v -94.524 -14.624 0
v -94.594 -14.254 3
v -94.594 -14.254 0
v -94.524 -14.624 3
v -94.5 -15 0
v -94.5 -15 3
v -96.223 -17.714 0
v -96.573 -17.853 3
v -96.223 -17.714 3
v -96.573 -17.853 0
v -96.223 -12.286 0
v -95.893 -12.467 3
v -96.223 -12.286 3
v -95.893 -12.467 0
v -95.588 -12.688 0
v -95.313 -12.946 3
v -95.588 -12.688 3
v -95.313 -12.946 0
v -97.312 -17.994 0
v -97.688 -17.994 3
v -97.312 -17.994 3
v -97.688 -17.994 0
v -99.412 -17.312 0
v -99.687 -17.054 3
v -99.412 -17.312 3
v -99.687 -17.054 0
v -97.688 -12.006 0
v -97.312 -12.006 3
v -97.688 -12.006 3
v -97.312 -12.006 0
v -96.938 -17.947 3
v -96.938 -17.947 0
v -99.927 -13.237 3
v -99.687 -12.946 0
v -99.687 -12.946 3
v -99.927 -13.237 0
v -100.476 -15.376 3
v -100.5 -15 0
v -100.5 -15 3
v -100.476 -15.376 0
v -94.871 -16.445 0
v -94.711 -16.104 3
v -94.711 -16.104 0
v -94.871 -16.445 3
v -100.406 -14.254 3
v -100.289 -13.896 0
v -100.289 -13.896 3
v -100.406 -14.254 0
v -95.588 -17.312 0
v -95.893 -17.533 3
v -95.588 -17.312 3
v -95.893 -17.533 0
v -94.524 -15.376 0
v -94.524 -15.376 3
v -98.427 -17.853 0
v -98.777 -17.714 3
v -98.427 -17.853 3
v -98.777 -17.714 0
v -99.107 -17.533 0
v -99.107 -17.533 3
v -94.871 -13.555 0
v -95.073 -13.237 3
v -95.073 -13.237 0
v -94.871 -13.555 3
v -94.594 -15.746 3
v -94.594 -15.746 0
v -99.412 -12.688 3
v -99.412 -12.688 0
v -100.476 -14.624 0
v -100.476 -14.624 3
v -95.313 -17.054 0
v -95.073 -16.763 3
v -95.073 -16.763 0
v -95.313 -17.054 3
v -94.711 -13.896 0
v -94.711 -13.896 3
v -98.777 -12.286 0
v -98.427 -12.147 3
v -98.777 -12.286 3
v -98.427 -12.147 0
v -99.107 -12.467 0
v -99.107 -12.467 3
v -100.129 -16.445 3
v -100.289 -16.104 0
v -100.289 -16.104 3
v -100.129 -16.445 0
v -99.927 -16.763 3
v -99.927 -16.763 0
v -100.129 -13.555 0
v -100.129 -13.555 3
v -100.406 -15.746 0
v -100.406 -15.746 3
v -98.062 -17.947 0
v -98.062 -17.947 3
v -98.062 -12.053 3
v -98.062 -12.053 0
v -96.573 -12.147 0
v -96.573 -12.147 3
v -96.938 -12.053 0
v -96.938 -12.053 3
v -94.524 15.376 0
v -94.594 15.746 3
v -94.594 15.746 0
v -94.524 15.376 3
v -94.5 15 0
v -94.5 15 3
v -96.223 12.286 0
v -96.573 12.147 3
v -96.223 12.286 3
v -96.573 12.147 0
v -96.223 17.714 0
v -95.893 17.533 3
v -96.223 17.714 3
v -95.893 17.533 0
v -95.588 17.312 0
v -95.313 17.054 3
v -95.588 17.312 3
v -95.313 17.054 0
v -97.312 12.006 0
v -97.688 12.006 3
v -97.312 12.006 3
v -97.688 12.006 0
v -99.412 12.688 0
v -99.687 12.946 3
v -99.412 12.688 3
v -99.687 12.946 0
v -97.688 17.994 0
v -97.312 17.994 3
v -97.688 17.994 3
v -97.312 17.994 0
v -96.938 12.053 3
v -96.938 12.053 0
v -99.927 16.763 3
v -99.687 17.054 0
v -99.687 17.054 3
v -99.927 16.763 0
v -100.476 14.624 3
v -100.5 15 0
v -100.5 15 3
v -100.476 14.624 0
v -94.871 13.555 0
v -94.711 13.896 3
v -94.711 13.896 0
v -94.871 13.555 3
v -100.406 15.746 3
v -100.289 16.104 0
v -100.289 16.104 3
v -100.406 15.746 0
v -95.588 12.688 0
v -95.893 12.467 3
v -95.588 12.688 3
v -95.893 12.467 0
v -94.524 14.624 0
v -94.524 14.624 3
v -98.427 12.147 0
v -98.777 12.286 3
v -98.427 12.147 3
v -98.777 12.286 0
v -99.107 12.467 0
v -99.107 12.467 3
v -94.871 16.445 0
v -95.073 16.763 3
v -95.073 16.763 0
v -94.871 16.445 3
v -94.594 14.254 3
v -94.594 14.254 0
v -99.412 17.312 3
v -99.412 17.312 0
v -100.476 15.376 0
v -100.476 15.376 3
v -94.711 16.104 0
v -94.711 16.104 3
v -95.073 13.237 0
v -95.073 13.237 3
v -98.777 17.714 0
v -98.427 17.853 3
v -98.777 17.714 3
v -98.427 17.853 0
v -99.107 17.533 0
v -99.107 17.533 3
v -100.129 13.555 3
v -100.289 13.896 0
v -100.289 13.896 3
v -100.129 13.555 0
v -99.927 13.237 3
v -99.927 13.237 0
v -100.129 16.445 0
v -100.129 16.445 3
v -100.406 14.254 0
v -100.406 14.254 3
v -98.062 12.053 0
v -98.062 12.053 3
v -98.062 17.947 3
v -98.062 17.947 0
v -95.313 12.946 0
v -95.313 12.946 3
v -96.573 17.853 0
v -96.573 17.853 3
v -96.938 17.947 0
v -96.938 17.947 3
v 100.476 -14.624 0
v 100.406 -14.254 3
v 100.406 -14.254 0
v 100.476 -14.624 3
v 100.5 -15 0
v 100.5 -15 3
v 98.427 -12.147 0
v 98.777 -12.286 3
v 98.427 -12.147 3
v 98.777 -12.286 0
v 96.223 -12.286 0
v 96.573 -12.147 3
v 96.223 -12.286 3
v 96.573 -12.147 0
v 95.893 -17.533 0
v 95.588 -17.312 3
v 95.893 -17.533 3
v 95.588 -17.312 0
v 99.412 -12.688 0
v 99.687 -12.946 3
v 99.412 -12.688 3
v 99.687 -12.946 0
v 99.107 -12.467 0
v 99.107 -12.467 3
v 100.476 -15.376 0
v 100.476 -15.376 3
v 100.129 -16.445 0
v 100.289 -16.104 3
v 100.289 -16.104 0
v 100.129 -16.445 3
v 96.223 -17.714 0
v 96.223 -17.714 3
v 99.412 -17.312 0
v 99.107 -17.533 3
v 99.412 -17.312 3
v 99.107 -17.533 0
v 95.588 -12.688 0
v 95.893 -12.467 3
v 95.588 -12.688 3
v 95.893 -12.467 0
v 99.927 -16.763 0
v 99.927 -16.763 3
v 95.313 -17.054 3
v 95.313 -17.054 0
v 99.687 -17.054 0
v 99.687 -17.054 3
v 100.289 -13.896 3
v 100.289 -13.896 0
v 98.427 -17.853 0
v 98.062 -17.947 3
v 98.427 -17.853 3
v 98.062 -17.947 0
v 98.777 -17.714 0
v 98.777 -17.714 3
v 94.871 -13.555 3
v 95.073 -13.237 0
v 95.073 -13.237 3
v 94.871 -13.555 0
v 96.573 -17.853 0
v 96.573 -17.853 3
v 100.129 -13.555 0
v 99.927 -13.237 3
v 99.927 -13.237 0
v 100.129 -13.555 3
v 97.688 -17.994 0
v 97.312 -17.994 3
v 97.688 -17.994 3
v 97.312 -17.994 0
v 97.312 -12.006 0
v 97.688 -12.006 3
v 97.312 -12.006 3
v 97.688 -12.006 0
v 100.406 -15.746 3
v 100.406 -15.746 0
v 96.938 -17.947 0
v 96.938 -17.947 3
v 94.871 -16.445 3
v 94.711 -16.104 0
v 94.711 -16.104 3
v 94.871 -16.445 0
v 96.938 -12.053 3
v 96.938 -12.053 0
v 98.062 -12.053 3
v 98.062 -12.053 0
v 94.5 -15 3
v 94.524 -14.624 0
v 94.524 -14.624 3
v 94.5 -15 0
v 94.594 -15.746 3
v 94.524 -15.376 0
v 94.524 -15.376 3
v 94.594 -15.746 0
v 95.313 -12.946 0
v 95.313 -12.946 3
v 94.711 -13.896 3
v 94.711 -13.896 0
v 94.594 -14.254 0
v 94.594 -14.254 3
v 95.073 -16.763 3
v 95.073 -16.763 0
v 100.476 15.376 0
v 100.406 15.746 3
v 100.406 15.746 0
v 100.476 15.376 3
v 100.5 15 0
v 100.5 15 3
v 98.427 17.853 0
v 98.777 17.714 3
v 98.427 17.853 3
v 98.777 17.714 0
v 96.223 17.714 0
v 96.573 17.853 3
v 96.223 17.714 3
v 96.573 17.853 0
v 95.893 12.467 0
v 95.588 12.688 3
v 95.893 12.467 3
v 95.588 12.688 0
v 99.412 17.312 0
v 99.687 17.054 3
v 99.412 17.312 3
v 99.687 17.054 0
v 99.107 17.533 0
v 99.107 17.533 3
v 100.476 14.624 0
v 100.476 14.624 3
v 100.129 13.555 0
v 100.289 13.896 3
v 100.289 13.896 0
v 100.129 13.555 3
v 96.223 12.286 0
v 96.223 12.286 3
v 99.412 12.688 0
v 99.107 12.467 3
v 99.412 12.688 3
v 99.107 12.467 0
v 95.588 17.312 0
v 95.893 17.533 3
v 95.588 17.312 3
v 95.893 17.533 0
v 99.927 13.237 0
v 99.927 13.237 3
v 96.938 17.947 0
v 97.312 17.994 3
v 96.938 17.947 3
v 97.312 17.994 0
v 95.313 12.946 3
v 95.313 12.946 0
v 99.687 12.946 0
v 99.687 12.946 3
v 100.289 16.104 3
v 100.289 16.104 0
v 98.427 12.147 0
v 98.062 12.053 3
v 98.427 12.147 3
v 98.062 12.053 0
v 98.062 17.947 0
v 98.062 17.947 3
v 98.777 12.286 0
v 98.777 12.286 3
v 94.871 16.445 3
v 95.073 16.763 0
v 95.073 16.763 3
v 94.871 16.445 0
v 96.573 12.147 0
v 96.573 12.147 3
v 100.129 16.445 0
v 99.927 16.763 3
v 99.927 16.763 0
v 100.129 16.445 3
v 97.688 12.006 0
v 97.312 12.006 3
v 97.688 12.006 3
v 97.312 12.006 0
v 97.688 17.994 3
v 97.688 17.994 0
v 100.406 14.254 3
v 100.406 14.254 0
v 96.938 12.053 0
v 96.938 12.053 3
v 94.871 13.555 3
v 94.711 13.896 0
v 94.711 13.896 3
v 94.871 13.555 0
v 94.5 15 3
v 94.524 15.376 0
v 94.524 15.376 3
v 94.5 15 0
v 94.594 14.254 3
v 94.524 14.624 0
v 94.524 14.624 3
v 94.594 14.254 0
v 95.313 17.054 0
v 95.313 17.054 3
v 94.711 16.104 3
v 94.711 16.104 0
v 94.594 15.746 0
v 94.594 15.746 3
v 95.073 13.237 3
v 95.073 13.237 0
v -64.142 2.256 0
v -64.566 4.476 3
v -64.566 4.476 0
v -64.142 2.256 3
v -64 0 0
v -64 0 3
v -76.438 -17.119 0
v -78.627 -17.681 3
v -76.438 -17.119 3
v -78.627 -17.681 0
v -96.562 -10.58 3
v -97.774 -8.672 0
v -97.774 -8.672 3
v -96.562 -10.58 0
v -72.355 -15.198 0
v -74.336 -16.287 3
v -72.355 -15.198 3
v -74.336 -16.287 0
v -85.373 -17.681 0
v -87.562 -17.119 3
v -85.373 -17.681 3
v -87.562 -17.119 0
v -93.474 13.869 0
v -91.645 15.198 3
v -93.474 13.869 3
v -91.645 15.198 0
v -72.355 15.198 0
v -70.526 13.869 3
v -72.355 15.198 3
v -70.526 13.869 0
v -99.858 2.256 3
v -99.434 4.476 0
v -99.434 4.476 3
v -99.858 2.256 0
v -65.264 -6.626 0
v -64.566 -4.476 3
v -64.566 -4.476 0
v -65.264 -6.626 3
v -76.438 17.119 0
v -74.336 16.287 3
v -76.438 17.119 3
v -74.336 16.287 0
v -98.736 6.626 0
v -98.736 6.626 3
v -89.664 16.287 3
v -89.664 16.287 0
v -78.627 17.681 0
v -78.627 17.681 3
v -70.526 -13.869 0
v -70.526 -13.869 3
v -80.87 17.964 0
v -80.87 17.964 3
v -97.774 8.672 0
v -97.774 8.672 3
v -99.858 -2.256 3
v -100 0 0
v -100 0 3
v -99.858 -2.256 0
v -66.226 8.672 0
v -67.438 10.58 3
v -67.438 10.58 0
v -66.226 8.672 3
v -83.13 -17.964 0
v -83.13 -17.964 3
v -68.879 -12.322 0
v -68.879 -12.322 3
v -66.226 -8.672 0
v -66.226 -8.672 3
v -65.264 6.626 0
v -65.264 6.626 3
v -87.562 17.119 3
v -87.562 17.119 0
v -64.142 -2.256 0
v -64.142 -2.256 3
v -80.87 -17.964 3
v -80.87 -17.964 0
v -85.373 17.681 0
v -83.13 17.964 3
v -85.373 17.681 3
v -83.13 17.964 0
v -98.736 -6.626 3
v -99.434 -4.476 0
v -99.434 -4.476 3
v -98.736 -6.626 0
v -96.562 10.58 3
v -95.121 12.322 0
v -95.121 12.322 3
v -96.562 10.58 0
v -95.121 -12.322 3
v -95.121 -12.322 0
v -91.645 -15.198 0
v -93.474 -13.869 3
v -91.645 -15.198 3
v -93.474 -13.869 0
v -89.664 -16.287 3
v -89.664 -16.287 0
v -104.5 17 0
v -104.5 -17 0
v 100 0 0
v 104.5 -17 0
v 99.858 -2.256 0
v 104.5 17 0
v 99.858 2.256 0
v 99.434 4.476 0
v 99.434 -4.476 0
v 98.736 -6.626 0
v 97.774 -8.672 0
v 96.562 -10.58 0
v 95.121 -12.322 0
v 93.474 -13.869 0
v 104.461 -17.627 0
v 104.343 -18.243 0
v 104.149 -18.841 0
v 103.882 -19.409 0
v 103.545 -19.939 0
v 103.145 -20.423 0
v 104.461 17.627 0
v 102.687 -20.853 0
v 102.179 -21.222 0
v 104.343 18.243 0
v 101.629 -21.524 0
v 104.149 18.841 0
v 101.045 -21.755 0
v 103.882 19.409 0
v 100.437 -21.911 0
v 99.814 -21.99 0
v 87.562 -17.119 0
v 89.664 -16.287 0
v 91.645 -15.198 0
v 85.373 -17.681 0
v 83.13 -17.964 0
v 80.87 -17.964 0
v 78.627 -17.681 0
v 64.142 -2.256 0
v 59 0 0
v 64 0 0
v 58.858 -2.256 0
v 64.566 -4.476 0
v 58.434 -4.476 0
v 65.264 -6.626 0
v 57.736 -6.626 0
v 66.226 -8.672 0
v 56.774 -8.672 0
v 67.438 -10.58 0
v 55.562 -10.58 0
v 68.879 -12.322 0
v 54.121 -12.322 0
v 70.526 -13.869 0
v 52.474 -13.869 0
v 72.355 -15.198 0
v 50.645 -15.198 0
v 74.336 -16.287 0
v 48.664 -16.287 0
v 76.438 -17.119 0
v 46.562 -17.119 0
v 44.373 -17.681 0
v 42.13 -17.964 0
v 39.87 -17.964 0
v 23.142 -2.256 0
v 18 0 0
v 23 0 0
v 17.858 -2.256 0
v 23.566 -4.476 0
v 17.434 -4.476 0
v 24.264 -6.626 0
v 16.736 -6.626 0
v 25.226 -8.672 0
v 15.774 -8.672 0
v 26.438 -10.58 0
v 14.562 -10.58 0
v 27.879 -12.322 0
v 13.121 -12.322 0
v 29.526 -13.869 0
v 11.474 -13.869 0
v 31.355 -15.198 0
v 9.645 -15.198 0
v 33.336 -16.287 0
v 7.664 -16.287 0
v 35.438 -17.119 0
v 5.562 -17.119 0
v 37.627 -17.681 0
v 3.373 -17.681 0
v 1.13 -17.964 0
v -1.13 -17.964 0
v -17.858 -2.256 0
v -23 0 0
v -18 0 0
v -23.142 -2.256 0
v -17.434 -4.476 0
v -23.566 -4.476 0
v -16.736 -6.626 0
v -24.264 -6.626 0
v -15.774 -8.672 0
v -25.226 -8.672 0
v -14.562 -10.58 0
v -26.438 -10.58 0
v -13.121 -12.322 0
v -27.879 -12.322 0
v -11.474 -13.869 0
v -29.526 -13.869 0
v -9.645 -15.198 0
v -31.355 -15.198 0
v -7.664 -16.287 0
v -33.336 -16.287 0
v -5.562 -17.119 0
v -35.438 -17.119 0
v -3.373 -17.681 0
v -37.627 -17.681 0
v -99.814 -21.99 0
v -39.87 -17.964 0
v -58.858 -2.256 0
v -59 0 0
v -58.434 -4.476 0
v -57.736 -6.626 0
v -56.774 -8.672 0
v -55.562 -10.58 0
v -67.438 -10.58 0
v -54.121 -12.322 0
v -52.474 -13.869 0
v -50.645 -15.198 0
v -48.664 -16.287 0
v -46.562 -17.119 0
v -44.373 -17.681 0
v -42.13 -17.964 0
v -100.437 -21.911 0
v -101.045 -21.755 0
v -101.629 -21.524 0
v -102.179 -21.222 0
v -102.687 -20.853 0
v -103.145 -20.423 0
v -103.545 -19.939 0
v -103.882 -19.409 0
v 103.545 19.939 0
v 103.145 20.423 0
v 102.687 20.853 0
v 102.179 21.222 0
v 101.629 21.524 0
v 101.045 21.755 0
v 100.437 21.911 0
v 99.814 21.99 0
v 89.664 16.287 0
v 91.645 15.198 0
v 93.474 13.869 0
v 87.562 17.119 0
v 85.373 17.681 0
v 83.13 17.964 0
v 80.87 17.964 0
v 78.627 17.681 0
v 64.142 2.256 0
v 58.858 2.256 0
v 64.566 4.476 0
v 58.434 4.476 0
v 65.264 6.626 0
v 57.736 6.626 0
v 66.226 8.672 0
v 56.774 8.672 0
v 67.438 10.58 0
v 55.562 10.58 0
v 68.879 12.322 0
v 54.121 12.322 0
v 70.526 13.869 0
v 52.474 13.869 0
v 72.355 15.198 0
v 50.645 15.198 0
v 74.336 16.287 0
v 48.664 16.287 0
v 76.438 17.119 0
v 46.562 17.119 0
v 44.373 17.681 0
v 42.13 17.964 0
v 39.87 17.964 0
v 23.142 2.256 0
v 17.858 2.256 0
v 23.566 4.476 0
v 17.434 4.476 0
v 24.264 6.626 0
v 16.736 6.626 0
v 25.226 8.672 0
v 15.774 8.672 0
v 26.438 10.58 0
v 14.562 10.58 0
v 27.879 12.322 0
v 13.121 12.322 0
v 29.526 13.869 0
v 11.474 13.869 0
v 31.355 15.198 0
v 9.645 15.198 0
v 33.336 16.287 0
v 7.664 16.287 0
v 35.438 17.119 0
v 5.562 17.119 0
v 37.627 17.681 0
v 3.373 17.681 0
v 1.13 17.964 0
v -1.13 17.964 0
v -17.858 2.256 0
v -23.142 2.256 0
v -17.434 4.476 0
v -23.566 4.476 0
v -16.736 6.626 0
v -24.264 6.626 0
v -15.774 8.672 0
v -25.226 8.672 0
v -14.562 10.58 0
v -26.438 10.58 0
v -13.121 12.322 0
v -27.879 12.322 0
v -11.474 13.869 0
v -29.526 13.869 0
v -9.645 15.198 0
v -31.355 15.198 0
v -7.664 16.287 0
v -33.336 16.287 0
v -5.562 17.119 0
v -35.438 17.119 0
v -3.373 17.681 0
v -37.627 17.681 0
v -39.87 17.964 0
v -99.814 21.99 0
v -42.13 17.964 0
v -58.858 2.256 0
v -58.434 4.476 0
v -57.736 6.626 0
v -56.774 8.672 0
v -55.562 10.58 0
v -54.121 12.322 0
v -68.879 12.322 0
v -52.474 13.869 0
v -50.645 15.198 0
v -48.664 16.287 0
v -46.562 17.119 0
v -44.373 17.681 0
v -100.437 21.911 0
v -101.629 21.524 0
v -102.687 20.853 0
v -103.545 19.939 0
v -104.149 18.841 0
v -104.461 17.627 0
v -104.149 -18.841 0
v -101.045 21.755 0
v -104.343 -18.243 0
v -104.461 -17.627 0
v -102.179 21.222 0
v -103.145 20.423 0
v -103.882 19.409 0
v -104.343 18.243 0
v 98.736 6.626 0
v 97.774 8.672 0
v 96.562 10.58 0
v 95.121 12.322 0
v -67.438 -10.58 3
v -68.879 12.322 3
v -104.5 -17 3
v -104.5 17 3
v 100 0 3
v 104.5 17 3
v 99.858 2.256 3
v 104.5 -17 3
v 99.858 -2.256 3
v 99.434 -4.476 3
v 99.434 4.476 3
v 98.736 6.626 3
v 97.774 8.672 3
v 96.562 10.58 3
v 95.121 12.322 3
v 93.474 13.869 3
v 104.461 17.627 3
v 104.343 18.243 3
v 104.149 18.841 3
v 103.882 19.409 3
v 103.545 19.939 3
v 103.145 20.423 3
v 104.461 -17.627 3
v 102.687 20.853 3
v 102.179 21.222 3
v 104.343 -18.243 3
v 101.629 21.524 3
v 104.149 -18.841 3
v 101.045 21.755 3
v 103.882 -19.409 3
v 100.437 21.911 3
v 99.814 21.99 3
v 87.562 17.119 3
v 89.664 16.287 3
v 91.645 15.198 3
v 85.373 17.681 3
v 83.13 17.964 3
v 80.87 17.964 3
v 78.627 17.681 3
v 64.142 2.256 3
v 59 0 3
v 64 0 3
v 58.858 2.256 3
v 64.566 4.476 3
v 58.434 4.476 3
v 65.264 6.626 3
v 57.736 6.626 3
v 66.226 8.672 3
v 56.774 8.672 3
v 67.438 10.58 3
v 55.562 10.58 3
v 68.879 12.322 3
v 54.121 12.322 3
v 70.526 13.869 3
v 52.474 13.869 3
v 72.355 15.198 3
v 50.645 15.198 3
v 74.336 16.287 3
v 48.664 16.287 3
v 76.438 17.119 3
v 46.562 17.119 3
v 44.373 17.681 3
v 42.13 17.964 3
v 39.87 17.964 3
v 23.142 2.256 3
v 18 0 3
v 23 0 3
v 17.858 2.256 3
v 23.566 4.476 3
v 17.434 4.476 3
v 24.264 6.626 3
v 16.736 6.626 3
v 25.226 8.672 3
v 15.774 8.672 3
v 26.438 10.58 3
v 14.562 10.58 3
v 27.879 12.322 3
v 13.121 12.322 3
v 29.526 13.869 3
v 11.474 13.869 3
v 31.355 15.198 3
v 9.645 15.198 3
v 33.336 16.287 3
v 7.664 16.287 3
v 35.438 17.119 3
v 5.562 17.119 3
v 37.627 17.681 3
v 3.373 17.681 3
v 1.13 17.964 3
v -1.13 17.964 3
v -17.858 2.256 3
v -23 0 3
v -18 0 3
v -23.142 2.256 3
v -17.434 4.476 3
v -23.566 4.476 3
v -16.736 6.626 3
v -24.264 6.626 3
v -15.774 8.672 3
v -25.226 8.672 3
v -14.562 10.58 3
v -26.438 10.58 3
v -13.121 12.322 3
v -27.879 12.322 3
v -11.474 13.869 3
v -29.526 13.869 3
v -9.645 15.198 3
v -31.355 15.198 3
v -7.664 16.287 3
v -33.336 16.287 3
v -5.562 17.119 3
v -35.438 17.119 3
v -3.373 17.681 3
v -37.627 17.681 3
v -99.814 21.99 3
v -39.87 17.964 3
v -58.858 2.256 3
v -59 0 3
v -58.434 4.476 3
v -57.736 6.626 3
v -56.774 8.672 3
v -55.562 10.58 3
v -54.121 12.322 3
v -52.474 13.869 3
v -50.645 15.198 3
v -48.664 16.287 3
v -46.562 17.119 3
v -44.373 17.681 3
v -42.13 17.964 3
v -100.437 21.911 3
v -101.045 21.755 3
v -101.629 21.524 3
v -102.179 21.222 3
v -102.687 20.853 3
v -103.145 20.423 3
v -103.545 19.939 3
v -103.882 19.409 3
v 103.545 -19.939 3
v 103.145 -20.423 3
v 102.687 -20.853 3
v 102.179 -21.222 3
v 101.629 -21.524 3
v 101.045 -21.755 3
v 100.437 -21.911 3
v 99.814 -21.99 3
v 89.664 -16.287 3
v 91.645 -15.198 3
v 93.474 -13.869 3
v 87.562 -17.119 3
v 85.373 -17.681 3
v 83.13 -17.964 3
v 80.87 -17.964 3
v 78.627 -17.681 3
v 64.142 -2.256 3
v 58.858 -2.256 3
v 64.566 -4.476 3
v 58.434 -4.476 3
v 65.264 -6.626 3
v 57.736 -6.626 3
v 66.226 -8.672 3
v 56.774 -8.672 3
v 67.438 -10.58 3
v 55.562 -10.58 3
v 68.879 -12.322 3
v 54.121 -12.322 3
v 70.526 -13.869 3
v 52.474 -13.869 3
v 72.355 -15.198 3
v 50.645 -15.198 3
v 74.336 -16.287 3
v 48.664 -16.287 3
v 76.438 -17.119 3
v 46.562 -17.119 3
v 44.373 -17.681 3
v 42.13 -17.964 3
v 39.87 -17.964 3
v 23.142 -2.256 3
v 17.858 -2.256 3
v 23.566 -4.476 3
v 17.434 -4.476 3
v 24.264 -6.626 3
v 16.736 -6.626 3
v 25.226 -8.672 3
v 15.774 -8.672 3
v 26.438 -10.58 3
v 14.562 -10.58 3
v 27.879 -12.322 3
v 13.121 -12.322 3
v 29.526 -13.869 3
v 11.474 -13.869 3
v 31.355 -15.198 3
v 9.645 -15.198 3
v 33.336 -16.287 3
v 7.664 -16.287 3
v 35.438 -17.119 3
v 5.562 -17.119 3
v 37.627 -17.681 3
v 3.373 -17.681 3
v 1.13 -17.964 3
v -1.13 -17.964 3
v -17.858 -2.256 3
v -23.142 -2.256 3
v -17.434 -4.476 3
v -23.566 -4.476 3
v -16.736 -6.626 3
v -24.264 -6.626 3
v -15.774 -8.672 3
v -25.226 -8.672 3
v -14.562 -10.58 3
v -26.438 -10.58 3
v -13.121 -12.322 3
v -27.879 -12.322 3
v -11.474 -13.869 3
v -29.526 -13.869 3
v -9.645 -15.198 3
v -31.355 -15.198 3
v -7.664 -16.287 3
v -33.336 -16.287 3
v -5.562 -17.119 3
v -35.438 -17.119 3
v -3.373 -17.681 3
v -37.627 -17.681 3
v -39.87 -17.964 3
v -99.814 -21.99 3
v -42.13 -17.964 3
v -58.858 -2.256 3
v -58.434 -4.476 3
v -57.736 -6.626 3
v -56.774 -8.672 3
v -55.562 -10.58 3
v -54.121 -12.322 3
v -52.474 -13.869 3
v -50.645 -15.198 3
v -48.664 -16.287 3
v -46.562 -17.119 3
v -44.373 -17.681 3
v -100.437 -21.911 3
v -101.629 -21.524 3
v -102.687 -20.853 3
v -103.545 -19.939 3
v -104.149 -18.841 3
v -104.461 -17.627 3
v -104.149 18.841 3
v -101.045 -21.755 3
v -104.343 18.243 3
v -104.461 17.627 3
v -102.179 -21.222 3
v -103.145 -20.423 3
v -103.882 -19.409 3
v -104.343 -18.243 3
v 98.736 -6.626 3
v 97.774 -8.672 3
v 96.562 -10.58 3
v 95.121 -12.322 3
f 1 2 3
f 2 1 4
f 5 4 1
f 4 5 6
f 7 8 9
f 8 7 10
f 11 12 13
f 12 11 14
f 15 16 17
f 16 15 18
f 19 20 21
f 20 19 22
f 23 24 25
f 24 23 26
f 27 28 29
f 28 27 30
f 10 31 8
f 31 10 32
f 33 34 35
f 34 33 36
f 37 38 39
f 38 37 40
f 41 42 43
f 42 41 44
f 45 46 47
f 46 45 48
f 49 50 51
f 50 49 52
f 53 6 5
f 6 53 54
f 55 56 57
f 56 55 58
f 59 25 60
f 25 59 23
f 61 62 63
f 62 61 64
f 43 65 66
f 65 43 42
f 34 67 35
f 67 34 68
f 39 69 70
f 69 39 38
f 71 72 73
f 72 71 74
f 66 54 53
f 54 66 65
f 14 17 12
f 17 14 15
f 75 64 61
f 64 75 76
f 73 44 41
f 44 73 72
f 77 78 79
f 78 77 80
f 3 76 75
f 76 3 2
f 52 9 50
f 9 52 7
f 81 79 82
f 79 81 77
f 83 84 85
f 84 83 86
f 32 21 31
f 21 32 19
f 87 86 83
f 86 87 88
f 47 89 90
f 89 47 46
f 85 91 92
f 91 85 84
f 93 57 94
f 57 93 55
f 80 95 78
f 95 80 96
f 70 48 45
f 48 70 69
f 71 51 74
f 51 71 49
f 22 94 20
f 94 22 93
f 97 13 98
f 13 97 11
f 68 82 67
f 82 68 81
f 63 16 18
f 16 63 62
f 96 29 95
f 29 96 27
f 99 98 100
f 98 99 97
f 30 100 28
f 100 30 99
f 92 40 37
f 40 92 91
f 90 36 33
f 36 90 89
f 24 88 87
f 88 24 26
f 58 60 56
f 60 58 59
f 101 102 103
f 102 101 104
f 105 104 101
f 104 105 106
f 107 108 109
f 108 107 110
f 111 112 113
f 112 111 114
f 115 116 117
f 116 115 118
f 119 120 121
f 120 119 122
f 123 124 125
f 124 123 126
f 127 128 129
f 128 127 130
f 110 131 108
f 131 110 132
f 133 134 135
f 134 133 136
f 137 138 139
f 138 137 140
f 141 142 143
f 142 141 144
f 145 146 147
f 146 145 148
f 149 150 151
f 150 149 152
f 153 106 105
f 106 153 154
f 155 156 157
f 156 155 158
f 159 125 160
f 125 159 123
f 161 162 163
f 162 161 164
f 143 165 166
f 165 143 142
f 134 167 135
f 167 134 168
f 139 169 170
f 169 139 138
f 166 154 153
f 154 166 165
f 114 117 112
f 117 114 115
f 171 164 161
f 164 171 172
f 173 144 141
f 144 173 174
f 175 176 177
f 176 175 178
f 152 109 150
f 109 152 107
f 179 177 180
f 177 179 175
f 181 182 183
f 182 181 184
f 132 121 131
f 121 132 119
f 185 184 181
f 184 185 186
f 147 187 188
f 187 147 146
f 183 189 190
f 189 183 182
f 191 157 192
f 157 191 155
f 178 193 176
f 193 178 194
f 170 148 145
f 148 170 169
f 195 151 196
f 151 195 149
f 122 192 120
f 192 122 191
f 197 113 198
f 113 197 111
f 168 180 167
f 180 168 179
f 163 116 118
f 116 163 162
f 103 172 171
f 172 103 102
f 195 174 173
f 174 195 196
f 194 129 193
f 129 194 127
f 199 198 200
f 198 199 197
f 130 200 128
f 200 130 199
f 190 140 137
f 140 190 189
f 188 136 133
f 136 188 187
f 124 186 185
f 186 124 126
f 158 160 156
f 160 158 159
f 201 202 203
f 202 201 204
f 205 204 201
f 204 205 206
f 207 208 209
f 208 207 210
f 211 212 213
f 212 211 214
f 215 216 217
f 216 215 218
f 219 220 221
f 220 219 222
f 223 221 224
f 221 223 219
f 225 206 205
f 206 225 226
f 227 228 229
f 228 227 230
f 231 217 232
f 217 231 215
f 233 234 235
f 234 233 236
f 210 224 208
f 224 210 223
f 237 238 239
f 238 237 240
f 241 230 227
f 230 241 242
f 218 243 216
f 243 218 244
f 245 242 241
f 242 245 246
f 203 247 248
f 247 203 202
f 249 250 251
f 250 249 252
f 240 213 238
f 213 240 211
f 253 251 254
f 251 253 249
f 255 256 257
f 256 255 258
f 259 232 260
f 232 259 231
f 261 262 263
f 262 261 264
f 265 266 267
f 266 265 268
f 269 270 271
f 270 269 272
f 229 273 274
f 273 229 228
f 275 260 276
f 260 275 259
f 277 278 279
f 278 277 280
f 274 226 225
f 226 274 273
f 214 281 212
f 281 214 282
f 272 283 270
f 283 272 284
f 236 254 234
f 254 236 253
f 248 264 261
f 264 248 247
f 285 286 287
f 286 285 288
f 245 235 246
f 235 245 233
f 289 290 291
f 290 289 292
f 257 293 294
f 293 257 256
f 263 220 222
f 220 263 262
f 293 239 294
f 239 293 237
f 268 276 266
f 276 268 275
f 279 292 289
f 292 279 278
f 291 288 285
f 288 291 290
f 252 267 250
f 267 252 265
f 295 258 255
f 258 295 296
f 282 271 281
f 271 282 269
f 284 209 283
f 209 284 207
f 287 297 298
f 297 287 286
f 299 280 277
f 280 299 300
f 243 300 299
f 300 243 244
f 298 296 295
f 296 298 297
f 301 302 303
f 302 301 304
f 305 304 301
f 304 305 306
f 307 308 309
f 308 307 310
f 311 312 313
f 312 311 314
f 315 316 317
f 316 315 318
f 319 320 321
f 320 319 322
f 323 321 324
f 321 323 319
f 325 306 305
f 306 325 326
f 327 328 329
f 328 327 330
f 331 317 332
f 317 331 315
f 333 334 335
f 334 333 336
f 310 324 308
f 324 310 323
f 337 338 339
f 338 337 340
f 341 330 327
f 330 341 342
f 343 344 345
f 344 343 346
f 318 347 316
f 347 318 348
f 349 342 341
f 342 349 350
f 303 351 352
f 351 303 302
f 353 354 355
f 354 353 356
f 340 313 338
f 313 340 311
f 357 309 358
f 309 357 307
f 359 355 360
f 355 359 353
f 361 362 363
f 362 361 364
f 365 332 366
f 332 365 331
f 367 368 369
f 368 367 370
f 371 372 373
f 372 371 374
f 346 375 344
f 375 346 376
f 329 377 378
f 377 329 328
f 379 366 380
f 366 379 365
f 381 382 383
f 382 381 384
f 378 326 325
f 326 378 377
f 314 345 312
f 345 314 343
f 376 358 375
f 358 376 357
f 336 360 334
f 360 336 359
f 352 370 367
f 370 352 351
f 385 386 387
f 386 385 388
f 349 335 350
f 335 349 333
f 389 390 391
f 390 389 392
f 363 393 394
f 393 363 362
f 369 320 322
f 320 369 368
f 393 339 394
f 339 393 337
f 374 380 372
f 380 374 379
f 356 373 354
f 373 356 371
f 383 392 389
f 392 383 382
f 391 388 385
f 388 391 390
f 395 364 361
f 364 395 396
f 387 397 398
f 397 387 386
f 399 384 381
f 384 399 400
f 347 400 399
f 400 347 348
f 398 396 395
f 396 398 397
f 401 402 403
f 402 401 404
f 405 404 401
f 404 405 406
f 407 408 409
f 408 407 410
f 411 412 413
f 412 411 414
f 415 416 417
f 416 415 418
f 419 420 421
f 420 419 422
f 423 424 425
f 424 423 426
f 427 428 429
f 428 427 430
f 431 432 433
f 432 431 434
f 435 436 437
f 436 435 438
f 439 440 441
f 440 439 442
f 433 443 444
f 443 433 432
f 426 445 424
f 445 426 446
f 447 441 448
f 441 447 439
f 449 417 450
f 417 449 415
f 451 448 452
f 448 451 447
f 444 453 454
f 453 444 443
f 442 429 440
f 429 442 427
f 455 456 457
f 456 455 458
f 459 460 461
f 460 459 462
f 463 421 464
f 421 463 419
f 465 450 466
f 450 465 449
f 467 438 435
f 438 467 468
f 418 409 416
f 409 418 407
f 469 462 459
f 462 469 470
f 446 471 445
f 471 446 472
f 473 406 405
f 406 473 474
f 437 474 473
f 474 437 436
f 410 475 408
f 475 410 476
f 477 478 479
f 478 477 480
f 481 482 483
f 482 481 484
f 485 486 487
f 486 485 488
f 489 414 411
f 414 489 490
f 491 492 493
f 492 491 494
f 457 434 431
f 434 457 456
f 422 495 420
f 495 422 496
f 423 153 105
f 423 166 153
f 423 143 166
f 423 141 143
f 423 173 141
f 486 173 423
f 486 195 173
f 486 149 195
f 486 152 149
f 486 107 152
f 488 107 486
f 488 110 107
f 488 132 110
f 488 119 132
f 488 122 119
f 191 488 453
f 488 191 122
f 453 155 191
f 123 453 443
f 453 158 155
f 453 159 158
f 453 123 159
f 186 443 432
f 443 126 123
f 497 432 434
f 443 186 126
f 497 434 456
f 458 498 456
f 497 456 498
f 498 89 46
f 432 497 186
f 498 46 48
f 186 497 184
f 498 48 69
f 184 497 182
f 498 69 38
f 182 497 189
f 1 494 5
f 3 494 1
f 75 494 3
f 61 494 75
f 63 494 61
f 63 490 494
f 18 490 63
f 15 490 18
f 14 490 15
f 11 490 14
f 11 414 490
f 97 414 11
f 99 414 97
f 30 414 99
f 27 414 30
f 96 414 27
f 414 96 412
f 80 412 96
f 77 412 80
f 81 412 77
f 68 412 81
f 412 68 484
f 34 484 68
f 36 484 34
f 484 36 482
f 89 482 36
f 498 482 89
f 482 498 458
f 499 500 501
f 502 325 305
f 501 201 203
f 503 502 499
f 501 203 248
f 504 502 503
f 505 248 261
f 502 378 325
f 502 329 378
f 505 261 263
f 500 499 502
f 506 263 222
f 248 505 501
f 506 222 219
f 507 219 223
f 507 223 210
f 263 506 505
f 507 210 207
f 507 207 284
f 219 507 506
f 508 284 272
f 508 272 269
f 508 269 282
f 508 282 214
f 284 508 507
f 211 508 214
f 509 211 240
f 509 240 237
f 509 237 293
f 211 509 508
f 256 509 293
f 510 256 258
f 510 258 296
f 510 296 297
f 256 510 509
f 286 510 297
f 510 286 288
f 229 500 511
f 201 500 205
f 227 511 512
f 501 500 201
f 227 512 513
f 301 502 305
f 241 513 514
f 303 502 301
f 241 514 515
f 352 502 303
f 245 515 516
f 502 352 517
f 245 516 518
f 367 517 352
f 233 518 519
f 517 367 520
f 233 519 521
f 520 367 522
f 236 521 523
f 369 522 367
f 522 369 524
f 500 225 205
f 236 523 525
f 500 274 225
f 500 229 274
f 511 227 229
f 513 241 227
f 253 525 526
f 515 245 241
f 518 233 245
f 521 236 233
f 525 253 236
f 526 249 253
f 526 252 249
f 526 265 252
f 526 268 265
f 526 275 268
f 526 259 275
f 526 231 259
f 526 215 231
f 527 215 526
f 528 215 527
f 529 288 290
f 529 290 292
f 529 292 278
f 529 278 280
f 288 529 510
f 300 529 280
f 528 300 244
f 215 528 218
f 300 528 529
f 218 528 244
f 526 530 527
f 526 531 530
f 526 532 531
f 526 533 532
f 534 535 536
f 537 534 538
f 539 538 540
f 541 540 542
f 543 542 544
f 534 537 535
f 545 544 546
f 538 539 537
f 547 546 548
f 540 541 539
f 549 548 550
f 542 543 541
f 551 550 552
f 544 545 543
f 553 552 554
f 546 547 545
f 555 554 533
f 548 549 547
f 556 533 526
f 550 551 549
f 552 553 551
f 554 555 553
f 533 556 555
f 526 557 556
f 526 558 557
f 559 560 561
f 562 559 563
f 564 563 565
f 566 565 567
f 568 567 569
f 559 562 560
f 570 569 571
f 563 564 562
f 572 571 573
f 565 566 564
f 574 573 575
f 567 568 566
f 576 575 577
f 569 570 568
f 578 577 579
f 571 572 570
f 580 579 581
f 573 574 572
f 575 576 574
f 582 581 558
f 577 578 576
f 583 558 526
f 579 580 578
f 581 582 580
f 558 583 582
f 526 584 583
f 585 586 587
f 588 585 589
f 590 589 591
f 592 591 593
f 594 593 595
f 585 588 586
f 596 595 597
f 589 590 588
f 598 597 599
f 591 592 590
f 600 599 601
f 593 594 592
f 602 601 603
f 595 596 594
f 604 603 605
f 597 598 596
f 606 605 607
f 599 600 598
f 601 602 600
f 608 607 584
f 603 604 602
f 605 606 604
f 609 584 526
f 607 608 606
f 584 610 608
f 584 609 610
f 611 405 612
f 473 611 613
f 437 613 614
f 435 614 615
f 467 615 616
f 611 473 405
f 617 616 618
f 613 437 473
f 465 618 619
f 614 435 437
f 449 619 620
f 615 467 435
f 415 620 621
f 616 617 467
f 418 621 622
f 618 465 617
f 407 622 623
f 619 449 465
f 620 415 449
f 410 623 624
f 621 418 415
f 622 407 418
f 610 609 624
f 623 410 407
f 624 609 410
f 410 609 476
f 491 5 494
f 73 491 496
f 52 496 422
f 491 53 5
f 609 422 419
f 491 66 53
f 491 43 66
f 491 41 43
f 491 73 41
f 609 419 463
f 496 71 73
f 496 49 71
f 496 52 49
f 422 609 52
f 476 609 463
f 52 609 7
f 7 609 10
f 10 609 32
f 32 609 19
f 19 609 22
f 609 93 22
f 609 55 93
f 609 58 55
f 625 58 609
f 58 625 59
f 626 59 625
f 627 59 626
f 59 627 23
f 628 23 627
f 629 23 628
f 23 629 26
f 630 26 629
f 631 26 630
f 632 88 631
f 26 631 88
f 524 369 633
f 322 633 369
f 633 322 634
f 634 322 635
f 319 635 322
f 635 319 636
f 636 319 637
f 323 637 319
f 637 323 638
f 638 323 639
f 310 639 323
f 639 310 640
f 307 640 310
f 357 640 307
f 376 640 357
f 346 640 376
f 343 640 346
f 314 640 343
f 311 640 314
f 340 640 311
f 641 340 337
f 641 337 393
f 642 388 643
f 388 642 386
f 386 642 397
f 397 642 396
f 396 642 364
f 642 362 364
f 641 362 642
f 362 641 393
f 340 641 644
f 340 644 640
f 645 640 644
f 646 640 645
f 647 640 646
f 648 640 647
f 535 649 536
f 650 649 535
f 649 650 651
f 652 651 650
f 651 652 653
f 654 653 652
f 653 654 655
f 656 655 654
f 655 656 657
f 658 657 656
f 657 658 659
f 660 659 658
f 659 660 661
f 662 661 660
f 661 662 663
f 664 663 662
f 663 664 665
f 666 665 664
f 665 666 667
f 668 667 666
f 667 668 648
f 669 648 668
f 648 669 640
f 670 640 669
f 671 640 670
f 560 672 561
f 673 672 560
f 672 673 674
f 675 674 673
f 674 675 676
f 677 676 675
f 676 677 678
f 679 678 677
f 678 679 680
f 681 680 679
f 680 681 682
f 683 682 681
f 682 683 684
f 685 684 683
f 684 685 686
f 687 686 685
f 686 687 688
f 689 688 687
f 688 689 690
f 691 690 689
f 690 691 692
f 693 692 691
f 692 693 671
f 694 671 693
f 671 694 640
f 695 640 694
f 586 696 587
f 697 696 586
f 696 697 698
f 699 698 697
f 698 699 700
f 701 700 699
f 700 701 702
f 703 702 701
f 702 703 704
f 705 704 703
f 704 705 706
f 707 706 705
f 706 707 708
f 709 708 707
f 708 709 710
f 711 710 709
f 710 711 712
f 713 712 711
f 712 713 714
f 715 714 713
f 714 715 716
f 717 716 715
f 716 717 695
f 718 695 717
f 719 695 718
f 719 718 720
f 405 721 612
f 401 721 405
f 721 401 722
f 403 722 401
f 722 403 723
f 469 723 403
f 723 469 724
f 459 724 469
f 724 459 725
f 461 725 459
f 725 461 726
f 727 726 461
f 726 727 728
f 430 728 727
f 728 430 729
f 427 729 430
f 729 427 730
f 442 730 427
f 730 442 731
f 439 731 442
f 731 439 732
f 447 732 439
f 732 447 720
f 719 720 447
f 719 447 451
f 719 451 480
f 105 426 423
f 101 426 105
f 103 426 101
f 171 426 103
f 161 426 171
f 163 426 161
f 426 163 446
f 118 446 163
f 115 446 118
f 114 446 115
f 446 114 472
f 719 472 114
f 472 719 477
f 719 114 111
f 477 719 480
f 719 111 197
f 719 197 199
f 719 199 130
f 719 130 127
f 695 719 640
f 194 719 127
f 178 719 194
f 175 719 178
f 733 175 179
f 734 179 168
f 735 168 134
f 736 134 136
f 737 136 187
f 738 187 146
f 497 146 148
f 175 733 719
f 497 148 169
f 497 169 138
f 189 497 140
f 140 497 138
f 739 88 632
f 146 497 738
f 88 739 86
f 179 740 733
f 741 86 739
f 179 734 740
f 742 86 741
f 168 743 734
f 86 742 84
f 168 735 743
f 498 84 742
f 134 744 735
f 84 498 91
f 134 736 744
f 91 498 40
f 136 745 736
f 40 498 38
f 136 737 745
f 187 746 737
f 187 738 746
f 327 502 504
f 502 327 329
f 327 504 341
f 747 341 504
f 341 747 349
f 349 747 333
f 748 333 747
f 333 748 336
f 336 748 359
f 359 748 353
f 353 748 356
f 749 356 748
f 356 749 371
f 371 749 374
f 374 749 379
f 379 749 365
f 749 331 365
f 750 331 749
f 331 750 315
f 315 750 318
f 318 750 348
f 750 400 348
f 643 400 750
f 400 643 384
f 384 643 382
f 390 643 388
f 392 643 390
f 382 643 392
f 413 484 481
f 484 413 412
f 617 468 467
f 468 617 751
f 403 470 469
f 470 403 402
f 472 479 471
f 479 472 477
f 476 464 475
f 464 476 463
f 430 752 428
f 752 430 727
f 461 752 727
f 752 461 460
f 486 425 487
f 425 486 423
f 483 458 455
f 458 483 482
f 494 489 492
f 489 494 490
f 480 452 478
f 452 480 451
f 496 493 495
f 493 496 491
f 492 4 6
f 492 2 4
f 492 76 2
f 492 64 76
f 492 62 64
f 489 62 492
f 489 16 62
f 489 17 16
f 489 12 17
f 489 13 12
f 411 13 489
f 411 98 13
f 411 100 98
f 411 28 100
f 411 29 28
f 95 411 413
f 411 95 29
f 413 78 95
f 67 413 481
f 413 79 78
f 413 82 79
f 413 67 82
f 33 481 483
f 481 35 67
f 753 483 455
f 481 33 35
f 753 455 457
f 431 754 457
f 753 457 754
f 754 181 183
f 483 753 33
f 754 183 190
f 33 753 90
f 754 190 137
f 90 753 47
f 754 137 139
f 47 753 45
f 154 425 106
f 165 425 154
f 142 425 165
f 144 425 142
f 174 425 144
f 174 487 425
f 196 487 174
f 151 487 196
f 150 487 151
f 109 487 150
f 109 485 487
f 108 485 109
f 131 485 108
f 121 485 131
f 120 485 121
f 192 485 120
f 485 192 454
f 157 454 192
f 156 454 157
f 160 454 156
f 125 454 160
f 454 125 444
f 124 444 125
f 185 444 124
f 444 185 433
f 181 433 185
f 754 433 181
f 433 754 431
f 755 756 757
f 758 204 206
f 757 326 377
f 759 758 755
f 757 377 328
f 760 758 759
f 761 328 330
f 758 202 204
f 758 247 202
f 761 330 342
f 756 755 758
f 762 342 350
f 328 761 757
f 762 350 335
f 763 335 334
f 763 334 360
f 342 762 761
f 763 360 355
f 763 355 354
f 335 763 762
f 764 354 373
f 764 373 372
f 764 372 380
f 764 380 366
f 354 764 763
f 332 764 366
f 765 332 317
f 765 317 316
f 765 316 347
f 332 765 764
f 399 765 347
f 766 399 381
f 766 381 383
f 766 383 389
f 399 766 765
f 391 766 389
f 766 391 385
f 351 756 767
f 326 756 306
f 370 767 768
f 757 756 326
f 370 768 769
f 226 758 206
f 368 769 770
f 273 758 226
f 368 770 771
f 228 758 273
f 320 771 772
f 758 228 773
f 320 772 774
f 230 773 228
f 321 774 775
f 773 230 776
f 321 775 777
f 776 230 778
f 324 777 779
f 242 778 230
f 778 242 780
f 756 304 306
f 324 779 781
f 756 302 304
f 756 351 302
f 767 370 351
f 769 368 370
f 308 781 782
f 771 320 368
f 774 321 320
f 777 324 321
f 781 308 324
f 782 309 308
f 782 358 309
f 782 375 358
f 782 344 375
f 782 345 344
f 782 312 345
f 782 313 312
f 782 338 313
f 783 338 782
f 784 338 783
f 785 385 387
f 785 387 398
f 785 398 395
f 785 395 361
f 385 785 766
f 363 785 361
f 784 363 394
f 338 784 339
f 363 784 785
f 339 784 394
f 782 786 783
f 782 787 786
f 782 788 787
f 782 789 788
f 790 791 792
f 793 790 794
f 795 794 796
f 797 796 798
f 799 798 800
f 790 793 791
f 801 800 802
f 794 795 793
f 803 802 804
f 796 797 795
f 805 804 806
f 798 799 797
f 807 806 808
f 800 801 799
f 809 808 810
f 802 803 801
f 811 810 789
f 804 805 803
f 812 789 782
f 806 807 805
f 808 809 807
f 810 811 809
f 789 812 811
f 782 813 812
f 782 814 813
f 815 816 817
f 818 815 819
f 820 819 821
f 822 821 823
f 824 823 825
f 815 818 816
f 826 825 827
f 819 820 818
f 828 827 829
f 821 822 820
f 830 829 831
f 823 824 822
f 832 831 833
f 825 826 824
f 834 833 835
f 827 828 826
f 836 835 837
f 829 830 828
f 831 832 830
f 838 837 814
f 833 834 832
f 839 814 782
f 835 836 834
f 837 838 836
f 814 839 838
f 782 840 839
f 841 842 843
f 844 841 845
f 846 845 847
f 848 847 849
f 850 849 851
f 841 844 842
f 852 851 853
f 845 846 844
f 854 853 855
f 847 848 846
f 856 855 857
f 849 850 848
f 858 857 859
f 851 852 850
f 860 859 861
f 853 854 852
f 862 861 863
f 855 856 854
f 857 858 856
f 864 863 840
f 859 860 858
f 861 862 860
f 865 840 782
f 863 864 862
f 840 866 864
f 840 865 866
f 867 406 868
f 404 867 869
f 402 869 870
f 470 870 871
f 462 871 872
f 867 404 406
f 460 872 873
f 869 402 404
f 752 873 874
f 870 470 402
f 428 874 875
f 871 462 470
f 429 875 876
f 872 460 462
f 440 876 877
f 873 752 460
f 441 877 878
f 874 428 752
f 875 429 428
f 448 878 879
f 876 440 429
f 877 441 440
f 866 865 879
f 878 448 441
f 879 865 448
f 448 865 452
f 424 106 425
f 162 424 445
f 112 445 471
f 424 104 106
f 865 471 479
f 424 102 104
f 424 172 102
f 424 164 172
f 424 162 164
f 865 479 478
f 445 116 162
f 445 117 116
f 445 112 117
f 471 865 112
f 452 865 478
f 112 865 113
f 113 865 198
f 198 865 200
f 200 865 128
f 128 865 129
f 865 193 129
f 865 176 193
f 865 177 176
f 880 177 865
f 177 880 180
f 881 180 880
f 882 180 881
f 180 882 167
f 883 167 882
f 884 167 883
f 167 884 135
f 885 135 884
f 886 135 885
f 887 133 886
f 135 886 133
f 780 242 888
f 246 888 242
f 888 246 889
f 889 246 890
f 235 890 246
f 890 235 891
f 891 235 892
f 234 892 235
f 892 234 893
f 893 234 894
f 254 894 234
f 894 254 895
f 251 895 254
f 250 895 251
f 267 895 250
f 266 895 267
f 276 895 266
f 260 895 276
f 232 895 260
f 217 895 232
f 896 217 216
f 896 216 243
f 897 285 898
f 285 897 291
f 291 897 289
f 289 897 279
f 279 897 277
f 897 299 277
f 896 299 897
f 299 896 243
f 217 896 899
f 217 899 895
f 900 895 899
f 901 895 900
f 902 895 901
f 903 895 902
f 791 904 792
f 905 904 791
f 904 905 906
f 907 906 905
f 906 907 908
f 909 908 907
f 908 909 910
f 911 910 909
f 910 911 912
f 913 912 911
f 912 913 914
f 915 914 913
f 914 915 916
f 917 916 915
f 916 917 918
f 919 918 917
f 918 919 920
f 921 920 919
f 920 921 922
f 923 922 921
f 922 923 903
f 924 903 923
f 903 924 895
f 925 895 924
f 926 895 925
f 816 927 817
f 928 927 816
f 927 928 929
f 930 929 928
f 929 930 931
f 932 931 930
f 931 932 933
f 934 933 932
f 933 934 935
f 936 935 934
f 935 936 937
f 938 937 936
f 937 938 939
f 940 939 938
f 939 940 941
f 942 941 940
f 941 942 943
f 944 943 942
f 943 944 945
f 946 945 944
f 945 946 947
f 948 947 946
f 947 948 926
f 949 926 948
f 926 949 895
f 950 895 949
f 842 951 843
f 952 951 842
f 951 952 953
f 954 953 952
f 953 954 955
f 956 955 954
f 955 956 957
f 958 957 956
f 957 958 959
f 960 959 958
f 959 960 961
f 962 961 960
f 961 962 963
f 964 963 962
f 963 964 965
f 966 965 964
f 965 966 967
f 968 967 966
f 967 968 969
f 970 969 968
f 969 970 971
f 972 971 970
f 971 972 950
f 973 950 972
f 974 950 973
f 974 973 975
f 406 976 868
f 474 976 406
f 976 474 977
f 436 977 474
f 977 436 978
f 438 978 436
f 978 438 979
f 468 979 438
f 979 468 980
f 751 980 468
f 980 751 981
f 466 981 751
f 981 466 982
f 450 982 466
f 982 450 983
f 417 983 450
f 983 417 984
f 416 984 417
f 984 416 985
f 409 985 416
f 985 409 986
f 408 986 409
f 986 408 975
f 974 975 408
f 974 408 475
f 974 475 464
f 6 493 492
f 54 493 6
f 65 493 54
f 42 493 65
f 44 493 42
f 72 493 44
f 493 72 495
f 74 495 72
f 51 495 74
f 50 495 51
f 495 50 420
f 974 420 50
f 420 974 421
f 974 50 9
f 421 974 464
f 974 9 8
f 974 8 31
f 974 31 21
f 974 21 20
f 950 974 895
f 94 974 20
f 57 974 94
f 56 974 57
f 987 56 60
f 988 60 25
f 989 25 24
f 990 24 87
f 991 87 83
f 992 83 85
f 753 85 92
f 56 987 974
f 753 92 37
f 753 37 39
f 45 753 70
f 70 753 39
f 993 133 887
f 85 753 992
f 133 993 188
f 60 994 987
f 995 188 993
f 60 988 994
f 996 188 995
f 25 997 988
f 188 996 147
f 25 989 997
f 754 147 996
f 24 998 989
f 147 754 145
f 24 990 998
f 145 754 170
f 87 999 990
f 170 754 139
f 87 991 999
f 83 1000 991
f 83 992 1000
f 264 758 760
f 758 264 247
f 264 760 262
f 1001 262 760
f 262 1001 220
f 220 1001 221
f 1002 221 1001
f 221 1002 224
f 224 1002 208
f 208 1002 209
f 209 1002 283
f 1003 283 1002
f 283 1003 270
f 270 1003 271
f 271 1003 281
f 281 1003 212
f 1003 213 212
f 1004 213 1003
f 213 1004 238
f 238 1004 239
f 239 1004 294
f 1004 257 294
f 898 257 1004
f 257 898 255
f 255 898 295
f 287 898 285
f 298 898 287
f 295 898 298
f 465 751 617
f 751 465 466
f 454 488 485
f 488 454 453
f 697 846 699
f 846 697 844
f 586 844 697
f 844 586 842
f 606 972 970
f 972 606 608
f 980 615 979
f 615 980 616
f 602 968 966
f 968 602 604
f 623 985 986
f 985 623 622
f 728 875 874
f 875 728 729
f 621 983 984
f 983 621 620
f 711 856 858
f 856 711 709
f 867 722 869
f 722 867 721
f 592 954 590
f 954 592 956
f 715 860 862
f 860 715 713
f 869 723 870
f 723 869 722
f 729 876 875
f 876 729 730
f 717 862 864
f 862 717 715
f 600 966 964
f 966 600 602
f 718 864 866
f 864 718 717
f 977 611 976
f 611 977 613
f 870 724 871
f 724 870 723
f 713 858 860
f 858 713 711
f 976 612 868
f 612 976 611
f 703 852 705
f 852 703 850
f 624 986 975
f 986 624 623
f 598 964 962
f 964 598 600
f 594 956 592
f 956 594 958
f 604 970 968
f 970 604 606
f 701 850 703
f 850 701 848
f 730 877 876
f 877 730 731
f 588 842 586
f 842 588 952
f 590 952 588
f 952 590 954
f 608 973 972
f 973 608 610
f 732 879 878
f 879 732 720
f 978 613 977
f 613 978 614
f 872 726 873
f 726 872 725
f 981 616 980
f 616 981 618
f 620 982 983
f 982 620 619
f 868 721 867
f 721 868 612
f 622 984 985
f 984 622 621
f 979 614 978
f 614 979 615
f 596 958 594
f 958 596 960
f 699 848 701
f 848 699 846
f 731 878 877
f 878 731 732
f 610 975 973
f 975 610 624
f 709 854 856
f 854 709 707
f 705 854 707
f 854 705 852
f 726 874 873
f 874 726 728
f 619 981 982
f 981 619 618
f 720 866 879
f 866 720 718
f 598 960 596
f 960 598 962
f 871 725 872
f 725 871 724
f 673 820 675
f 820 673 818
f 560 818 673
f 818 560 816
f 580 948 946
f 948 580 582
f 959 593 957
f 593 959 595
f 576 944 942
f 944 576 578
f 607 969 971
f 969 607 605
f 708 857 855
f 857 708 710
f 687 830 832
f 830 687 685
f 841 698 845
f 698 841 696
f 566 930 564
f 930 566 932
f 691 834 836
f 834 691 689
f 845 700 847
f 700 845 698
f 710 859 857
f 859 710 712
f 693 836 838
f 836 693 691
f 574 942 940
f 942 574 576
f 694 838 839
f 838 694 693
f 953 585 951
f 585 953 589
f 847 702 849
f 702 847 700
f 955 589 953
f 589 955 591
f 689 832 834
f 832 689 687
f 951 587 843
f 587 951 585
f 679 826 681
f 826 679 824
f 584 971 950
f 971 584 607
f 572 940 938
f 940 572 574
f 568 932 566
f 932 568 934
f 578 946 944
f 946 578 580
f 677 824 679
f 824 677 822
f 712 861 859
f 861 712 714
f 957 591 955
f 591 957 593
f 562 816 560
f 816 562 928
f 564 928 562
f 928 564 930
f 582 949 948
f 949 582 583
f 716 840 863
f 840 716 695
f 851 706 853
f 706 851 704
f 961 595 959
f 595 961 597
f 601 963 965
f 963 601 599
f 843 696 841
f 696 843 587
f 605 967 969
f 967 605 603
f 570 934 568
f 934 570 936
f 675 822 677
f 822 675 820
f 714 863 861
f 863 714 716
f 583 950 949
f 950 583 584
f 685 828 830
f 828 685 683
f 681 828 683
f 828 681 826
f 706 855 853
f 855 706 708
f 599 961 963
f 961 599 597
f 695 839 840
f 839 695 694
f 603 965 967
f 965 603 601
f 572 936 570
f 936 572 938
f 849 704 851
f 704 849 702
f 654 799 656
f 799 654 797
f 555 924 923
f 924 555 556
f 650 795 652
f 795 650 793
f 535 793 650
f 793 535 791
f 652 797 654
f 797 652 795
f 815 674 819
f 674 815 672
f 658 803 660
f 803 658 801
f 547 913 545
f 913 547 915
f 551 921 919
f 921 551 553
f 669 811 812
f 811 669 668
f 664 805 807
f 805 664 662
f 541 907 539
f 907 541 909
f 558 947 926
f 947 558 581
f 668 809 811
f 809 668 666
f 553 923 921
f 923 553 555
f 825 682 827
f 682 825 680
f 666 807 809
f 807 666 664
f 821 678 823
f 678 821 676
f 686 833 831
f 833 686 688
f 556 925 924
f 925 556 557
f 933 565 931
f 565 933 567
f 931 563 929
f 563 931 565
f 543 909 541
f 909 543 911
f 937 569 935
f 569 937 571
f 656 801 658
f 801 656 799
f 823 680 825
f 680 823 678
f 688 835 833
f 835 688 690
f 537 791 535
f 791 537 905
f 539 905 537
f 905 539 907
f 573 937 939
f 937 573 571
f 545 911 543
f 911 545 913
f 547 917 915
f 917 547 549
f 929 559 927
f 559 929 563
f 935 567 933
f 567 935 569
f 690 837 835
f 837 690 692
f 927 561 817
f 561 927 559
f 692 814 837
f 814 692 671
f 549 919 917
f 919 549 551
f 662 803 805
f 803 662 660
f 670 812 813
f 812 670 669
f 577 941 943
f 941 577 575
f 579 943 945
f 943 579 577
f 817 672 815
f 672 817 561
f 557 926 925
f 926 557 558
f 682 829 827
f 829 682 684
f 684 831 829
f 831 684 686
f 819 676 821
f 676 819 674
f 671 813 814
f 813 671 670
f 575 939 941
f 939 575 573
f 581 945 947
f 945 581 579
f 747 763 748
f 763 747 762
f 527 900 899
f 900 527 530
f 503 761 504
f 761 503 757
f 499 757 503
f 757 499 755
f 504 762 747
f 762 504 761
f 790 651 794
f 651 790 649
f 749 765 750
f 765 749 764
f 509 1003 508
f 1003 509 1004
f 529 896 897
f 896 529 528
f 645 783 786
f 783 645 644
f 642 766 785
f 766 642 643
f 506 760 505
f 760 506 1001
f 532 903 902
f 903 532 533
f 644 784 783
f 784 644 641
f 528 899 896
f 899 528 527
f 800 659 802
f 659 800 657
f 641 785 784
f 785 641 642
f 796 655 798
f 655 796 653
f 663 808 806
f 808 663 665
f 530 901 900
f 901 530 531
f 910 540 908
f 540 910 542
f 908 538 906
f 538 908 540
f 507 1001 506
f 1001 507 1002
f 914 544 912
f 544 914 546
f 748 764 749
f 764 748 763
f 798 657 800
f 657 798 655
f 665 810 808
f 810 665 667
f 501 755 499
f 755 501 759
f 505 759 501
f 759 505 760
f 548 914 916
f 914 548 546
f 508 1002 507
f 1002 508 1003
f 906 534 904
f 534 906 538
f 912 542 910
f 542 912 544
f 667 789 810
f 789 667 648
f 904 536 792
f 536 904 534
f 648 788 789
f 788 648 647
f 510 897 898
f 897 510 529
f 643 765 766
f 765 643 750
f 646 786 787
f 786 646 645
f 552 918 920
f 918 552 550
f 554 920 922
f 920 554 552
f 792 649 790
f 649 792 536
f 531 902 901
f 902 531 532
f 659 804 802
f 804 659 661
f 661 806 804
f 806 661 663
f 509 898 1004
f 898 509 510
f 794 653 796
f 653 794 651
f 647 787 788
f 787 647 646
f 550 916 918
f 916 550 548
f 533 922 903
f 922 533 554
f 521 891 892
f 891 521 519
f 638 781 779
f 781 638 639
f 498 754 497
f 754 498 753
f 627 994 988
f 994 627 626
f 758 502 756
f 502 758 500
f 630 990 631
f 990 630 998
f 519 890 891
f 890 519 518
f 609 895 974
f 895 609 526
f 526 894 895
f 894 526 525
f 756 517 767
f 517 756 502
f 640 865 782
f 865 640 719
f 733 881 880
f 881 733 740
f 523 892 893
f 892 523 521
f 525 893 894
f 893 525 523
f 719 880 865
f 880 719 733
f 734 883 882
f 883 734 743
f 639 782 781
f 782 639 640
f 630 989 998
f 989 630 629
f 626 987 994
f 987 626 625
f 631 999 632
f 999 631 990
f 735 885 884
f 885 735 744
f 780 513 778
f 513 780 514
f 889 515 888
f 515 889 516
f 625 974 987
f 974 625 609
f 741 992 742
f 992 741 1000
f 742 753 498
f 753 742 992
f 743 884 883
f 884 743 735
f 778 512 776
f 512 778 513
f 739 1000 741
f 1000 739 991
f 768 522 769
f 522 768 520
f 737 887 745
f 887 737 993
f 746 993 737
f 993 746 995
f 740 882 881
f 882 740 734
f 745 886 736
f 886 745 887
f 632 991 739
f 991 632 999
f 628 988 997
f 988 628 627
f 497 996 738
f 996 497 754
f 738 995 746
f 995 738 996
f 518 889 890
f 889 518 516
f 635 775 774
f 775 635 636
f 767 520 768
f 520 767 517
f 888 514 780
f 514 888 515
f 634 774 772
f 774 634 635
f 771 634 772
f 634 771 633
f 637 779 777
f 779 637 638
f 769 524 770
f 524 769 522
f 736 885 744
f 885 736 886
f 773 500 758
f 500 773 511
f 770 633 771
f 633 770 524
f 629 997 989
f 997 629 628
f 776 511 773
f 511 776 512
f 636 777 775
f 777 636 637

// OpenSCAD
$fn = 50;


difference() {
	union() {
		hull() {
			translate(v = [-99.5000000000, 17.0000000000, 0]) {
				cylinder(h = 3, r = 5);
			}
			translate(v = [99.5000000000, 17.0000000000, 0]) {
				cylinder(h = 3, r = 5);
			}
			translate(v = [-99.5000000000, -17.0000000000, 0]) {
				cylinder(h = 3, r = 5);
			}
			translate(v = [99.5000000000, -17.0000000000, 0]) {
				cylinder(h = 3, r = 5);
			}
		}
	}
	union() {
		#translate(v = [-97.5000000000, -15.0000000000, -100.0000000000]) {
			cylinder(h = 200, r = 3.0000000000);
		}
		#translate(v = [-97.5000000000, 15.0000000000, -100.0000000000]) {
			cylinder(h = 200, r = 3.0000000000);
		}
		#translate(v = [97.5000000000, -15.0000000000, -100.0000000000]) {
			cylinder(h = 200, r = 3.0000000000);
		}
		#translate(v = [97.5000000000, 15.0000000000, -100.0000000000]) {
			cylinder(h = 200, r = 3.0000000000);
		}
		#translate(v = [-82.0000000000, 0, 0]) {
			cylinder(h = 3, r = 18.0000000000);
		}
		#translate(v = [-41.0000000000, 0, 0]) {
			cylinder(h = 3, r = 18.0000000000);
		}
		#cylinder(h = 3, r = 18.0000000000);
		#translate(v = [41.0000000000, 0, 0]) {
			cylinder(h = 3, r = 18.0000000000);
		}
		#translate(v = [82.0000000000, 0, 0]) {
			cylinder(h = 3, r = 18.0000000000);
		}
	}
}
